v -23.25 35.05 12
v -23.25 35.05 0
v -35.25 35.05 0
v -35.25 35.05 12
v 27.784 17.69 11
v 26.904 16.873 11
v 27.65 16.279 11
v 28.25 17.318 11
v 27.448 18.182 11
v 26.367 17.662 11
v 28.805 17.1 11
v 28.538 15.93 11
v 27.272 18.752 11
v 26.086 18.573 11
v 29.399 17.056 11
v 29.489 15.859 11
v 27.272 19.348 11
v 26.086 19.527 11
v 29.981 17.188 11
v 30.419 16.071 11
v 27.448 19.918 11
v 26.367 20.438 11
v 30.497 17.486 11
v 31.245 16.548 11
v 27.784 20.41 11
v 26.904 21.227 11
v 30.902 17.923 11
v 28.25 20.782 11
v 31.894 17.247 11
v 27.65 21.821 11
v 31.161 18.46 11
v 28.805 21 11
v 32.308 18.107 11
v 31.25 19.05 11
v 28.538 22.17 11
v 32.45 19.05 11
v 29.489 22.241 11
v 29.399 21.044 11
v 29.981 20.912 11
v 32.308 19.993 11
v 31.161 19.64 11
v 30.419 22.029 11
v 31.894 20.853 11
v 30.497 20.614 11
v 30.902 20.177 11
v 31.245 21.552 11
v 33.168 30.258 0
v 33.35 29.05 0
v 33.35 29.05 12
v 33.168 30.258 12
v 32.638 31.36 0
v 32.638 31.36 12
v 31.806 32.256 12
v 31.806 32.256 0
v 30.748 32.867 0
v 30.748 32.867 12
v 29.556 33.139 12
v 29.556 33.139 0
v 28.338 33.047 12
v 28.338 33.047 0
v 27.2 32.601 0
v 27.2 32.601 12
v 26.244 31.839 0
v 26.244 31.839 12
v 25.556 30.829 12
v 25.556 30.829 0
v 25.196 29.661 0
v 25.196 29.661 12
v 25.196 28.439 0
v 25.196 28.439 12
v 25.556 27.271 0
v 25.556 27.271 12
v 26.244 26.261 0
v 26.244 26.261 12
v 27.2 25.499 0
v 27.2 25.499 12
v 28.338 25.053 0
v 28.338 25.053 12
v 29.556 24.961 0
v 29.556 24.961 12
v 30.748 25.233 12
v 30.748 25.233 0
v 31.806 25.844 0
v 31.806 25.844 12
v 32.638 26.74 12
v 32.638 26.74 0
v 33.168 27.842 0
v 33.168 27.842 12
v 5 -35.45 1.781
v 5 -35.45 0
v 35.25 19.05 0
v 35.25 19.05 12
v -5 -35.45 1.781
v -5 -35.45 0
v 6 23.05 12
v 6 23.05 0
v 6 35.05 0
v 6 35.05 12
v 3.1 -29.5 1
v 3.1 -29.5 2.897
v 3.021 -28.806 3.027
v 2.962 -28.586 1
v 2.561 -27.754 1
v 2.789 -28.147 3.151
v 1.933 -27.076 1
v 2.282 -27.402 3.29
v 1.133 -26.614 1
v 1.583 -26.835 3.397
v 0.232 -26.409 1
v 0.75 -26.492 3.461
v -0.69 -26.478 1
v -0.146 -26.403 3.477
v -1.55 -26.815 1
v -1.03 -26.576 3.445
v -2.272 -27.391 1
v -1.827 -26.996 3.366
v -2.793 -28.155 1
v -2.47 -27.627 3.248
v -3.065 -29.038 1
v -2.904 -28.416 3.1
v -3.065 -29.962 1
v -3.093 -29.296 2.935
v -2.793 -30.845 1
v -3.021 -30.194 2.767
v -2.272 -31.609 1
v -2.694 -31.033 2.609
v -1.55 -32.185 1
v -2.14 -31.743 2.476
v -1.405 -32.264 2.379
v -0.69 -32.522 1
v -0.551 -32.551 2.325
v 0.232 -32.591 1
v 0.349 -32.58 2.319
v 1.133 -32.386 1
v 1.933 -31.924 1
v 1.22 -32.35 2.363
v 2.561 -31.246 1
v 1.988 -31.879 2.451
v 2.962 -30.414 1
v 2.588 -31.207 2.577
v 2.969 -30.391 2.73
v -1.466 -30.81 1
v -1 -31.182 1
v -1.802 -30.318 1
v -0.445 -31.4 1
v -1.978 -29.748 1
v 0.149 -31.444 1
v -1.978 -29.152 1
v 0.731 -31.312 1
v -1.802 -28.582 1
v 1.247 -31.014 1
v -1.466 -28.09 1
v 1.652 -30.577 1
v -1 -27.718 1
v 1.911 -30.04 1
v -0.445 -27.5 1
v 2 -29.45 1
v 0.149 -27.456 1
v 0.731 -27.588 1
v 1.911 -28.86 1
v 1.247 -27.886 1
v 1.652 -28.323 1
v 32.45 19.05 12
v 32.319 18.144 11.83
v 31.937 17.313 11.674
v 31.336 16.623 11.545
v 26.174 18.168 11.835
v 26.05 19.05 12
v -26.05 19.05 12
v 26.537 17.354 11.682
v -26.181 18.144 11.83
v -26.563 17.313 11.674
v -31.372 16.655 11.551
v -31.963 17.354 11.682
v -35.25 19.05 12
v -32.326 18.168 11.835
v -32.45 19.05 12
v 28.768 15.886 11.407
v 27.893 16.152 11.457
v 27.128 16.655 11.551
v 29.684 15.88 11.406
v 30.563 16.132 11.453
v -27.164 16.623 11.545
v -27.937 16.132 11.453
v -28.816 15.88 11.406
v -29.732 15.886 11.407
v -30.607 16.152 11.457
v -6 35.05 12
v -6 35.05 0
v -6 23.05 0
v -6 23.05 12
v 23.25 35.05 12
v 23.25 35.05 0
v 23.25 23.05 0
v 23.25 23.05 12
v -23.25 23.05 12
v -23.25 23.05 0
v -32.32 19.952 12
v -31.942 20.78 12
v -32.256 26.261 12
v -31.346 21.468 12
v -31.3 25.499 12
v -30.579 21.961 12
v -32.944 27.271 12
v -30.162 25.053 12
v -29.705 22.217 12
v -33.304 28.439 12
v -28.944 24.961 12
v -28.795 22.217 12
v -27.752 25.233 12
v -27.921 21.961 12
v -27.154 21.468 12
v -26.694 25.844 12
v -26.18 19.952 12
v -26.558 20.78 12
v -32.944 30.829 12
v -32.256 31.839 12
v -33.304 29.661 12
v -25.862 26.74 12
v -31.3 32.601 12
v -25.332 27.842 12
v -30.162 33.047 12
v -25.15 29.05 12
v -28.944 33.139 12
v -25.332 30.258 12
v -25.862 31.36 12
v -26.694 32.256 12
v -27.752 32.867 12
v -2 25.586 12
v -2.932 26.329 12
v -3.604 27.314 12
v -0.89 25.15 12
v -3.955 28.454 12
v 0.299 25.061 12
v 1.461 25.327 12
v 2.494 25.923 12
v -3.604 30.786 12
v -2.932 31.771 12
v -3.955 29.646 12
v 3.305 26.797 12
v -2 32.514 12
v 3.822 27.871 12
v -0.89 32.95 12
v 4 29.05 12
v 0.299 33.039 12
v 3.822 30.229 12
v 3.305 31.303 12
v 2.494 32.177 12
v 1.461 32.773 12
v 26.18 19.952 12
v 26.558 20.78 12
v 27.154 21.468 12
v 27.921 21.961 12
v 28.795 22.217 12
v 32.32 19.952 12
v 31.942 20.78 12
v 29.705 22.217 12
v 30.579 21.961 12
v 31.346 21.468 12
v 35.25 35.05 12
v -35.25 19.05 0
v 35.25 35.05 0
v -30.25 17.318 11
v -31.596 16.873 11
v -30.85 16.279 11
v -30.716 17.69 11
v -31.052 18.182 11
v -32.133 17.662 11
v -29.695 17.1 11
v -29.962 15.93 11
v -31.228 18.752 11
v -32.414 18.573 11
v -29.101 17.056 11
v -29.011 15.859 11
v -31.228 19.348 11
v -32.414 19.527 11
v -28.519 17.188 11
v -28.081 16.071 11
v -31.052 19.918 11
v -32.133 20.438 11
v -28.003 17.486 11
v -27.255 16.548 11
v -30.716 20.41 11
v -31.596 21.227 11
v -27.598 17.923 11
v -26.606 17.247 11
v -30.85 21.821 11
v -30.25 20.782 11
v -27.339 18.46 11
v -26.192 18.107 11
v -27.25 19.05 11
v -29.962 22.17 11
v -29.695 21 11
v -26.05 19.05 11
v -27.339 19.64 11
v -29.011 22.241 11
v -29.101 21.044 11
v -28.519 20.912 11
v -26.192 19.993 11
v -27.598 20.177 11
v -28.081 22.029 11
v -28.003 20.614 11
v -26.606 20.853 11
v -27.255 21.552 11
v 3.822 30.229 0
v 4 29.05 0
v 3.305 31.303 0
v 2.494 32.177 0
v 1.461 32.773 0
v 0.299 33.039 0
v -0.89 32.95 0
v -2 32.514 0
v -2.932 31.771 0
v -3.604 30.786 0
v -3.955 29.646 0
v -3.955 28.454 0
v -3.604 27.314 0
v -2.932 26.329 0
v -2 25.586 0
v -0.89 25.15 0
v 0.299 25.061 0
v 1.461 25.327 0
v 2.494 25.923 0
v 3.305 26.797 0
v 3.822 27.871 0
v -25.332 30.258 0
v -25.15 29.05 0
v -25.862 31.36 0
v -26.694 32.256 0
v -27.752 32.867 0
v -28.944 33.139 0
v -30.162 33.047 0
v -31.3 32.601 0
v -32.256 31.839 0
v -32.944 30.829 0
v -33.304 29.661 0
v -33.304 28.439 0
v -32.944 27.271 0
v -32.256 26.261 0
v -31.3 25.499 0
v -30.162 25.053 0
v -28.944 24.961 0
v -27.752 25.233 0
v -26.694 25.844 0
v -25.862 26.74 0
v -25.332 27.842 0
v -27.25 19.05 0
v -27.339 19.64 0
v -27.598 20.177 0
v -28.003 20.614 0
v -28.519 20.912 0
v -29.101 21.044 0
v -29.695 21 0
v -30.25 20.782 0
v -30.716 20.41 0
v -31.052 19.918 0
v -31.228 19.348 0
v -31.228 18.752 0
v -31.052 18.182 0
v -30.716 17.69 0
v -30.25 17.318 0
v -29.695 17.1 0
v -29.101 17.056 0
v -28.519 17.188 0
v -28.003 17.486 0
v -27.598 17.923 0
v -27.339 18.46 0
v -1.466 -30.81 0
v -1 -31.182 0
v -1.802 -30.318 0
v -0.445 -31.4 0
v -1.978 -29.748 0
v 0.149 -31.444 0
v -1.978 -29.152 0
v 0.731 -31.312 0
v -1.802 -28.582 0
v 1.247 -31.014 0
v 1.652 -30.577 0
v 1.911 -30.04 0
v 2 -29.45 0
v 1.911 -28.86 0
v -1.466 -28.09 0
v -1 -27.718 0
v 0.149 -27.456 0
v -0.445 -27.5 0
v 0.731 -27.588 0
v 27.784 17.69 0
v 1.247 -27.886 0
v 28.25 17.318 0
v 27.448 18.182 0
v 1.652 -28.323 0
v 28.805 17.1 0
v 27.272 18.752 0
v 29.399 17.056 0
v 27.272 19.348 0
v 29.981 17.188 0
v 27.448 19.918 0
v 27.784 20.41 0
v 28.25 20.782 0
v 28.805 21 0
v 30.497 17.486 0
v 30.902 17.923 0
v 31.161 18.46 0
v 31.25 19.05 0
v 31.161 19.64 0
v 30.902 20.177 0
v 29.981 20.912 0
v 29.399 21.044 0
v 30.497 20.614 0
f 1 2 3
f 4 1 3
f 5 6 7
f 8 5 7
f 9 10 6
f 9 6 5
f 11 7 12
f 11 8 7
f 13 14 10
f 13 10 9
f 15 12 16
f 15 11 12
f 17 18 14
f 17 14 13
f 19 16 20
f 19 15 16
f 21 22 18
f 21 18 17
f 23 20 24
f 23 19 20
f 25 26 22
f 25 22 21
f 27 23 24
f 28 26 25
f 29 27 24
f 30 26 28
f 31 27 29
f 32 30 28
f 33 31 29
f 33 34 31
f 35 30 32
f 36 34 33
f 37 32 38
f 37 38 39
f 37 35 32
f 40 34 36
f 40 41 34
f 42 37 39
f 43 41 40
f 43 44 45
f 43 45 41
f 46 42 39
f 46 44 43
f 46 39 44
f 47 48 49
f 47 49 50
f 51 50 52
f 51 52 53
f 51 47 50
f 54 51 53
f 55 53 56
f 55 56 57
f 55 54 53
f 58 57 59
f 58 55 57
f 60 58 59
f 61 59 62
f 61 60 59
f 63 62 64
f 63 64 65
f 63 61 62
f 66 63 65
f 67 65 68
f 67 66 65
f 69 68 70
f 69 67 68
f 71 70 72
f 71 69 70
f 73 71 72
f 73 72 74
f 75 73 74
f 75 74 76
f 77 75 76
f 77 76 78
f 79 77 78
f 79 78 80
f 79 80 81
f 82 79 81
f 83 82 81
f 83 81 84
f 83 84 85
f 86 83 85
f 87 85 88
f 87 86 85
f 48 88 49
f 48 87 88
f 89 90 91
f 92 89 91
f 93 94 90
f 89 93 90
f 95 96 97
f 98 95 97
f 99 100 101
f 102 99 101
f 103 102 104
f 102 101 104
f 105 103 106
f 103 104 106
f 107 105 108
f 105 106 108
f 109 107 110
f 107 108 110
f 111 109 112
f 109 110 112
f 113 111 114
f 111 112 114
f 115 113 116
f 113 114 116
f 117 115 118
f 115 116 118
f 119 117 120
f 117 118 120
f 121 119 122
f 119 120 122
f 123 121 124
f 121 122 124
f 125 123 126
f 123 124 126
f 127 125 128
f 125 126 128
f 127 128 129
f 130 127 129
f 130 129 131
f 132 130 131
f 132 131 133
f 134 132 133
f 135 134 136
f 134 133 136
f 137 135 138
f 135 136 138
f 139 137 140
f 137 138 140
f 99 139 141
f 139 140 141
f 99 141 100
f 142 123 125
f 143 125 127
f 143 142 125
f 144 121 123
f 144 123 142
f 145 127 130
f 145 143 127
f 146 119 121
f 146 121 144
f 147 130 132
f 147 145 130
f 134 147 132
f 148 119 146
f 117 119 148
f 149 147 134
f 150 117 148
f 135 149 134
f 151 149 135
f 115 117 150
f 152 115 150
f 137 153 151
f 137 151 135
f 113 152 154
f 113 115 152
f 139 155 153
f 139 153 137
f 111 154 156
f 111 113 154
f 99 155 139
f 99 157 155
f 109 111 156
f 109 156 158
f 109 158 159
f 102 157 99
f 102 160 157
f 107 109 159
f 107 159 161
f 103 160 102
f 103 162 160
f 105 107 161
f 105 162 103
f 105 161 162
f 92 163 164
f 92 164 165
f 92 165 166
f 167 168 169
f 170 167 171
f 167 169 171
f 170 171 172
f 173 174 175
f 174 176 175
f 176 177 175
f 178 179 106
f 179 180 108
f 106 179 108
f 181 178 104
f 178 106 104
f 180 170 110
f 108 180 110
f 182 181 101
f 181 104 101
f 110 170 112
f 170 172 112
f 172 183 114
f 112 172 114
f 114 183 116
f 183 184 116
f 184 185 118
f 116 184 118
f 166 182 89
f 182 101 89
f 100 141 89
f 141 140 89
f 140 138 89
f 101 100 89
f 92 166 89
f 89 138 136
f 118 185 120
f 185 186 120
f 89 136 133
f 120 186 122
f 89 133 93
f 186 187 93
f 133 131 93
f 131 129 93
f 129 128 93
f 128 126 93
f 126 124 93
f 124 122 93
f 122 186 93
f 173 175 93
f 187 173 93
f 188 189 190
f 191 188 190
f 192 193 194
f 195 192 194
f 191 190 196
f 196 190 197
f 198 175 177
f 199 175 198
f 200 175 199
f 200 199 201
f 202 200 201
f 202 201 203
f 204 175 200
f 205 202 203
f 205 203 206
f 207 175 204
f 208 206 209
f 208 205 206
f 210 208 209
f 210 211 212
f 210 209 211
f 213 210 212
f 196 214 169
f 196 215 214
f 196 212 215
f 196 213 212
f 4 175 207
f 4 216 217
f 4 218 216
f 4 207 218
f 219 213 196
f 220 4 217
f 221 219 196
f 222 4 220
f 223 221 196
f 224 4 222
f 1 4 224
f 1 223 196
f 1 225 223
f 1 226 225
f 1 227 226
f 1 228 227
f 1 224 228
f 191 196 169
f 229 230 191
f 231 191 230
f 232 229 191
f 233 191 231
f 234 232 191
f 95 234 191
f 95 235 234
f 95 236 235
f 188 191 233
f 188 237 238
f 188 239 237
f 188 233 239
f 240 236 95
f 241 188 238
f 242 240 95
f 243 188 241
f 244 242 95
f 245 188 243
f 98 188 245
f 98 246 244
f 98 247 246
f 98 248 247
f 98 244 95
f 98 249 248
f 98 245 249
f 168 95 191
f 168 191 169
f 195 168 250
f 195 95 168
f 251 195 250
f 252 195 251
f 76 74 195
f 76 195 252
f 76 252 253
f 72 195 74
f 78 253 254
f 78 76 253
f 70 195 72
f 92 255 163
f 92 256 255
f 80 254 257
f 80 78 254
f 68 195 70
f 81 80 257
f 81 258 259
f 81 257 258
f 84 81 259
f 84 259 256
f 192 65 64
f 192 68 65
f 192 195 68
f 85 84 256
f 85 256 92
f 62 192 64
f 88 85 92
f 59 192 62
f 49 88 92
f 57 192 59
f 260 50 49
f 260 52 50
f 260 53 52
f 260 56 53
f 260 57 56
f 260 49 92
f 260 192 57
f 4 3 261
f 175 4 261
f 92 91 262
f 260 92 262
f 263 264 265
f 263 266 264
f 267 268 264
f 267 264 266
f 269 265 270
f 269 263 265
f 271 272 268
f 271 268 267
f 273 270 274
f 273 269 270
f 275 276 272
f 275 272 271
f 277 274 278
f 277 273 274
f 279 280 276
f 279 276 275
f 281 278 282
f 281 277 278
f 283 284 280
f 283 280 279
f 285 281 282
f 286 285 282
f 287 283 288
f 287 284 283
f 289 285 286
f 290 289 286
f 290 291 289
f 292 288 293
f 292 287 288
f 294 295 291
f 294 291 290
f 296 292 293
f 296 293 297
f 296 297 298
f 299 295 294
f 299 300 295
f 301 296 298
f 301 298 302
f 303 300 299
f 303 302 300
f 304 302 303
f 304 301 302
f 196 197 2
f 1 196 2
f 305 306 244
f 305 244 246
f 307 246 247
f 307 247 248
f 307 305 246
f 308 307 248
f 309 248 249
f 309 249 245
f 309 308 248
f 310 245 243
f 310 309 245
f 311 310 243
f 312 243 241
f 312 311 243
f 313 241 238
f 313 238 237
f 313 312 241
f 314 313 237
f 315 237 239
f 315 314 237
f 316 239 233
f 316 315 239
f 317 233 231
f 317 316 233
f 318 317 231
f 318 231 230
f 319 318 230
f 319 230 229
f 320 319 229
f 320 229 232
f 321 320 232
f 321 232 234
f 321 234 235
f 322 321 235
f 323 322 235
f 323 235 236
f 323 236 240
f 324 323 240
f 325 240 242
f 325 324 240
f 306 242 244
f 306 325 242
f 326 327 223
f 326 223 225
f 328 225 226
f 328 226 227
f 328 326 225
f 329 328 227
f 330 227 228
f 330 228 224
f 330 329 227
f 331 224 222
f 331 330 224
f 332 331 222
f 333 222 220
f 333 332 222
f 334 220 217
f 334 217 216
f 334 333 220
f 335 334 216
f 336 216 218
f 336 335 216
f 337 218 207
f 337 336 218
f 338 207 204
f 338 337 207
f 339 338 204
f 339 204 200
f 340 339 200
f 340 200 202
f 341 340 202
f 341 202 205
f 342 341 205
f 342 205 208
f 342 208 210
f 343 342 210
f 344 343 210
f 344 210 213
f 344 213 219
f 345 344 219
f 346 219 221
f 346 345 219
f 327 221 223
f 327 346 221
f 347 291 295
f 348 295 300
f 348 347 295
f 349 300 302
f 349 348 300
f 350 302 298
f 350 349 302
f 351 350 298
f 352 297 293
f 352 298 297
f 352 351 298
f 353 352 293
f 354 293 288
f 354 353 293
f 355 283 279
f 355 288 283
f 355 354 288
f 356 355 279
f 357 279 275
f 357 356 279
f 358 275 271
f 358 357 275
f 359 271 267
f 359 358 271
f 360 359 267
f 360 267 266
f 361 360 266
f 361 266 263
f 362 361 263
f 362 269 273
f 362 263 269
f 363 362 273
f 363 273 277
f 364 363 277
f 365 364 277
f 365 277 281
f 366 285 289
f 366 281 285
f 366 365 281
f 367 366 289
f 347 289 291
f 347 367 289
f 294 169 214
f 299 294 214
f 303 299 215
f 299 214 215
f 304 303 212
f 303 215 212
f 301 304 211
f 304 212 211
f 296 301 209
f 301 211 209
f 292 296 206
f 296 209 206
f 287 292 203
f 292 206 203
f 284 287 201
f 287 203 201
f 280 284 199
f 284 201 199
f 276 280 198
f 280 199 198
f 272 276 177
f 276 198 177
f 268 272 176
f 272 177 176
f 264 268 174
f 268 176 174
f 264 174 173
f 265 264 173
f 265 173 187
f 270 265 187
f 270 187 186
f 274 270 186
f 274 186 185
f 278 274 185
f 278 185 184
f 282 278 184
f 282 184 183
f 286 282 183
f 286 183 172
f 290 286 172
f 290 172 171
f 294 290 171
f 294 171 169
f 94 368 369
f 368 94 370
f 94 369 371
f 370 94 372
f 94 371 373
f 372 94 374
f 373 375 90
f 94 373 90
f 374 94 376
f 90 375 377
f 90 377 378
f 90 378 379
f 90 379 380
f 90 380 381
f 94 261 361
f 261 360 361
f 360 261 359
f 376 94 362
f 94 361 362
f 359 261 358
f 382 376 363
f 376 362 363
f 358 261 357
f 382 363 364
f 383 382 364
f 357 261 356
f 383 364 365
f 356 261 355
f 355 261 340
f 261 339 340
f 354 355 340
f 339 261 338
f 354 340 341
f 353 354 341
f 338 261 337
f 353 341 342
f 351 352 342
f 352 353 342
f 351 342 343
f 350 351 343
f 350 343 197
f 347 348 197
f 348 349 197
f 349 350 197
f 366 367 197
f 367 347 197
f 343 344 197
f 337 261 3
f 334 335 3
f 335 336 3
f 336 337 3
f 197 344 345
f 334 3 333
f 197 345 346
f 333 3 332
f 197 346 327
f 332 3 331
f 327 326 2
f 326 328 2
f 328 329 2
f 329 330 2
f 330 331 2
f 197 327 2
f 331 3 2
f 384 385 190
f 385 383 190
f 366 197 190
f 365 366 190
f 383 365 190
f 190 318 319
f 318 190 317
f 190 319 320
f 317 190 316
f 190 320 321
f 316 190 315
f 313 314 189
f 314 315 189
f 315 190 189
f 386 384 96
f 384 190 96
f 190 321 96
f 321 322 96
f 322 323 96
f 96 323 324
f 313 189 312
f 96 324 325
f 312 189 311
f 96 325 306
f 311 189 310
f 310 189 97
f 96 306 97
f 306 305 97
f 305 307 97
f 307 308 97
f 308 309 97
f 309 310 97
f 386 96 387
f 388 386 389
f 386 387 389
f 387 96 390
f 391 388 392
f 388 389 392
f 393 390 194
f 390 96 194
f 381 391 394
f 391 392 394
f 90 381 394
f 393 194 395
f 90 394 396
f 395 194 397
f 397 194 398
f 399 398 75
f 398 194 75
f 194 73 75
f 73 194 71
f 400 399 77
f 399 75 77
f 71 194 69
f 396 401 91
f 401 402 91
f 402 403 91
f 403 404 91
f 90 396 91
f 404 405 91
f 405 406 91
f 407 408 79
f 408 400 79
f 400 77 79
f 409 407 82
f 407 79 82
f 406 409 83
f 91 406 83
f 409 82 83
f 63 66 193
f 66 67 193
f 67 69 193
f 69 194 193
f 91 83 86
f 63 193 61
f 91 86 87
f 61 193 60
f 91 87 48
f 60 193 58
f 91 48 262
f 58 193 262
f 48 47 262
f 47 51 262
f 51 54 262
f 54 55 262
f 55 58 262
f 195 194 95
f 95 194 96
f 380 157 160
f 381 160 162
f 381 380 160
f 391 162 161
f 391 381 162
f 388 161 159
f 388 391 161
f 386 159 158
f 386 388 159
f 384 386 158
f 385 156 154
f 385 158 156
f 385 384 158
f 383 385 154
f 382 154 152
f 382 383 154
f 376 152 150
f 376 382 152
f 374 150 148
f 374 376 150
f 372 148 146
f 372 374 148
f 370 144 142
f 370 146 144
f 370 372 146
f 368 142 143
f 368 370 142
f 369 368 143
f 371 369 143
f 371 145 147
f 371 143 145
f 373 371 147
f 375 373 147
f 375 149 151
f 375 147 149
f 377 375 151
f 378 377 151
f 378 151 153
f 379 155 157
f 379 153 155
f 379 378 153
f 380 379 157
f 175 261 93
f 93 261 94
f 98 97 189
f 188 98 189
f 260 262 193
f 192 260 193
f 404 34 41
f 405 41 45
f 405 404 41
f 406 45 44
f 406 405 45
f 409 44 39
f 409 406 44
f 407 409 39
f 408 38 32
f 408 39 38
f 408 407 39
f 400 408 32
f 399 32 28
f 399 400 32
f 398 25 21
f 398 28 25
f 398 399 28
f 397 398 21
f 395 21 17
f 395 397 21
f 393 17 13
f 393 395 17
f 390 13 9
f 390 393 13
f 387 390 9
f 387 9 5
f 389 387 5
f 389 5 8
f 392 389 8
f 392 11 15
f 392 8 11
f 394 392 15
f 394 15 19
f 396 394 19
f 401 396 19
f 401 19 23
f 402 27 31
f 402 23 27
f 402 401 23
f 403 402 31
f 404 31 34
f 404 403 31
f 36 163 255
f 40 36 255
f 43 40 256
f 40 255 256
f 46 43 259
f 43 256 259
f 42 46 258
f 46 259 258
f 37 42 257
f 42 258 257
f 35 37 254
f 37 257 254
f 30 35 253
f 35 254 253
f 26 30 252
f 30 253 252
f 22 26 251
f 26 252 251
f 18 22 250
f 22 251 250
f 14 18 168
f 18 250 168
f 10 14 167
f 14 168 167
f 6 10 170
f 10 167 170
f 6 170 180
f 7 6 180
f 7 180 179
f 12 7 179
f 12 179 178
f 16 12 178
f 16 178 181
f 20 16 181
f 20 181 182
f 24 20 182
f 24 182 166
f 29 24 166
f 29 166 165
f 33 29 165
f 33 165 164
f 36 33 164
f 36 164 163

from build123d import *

# Parameters (mm, degrees)
SKETCH004_R       = 3.1
PAD001_DEPTH      = 1
PAD001_DEPTH_BACK = 4
SKETCH_R          = 4.1
SKETCH_R_2        = 4
SKETCH_R_3        = 2
PAD_DEPTH         = 12
POCKET_DEPTH      = 70.501
SKETCH002_R       = 3.2
POCKET001_DEPTH   = 1


with BuildPart() as pad001:
    # Sketch004 → Pad001 (new body, two sides)
    with BuildSketch(Plane.XY.offset(5)) as pad001_sk:
        with Locations((0, -29.5)):
            Circle(SKETCH004_R)
    extrude(amount=PAD001_DEPTH)
    extrude(pad001_sk.sketch, amount=-PAD001_DEPTH_BACK)


with BuildPart() as cut:
    # Sketch → Pad (new body)
    with BuildSketch(Plane.XY):
        Polygon((-35.25, 35.05), (-35.25, 19.05), (-5, -35.45), (5, -35.45), (35.25, 19.05), (35.25, 35.05), (23.25, 35.05), (23.25, 23.05), (6, 23.05), (6, 35.05), (-6, 35.05), (-6, 23.05), (-23.25, 23.05), (-23.25, 35.05), align=None)
        with Locations((-29.25, 29.05)):
            Circle(SKETCH_R, mode=Mode.SUBTRACT)
        with Locations((0, 29.05)):
            Circle(SKETCH_R_2, mode=Mode.SUBTRACT)
        with Locations((29.25, 29.05)):
            Circle(SKETCH_R, mode=Mode.SUBTRACT)
        with Locations((-29.25, 19.05)):
            Circle(SKETCH_R_3, mode=Mode.SUBTRACT)
        with Locations((29.25, 19.05)):
            Circle(SKETCH_R_3, mode=Mode.SUBTRACT)
        with Locations((0, -29.45)):
            Circle(SKETCH_R_3, mode=Mode.SUBTRACT)
    extrude(amount=PAD_DEPTH)

    # Sketch001 → Pocket (cut, through all)
    with BuildSketch(Plane(origin=(-35.25, 0, 0), x_dir=(0, -1, 0), z_dir=(-1, 0, 0))):
        Polygon((-19.05, 12), (44.95, 0), (44.95, 12), align=None)
    extrude(amount=-POCKET_DEPTH, mode=Mode.SUBTRACT)

    # Sketch002 → Pocket001 (cut)
    with BuildSketch(Plane.XY.offset(12)):
        with Locations((-29.25, 19.05)):
            Circle(SKETCH002_R)
        with Locations((29.25, 19.05)):
            Circle(SKETCH002_R)
    extrude(amount=-POCKET001_DEPTH, mode=Mode.SUBTRACT)

    # Cut: cut Pad001
    add(pad001.part, mode=Mode.SUBTRACT)


solid = cut.part
